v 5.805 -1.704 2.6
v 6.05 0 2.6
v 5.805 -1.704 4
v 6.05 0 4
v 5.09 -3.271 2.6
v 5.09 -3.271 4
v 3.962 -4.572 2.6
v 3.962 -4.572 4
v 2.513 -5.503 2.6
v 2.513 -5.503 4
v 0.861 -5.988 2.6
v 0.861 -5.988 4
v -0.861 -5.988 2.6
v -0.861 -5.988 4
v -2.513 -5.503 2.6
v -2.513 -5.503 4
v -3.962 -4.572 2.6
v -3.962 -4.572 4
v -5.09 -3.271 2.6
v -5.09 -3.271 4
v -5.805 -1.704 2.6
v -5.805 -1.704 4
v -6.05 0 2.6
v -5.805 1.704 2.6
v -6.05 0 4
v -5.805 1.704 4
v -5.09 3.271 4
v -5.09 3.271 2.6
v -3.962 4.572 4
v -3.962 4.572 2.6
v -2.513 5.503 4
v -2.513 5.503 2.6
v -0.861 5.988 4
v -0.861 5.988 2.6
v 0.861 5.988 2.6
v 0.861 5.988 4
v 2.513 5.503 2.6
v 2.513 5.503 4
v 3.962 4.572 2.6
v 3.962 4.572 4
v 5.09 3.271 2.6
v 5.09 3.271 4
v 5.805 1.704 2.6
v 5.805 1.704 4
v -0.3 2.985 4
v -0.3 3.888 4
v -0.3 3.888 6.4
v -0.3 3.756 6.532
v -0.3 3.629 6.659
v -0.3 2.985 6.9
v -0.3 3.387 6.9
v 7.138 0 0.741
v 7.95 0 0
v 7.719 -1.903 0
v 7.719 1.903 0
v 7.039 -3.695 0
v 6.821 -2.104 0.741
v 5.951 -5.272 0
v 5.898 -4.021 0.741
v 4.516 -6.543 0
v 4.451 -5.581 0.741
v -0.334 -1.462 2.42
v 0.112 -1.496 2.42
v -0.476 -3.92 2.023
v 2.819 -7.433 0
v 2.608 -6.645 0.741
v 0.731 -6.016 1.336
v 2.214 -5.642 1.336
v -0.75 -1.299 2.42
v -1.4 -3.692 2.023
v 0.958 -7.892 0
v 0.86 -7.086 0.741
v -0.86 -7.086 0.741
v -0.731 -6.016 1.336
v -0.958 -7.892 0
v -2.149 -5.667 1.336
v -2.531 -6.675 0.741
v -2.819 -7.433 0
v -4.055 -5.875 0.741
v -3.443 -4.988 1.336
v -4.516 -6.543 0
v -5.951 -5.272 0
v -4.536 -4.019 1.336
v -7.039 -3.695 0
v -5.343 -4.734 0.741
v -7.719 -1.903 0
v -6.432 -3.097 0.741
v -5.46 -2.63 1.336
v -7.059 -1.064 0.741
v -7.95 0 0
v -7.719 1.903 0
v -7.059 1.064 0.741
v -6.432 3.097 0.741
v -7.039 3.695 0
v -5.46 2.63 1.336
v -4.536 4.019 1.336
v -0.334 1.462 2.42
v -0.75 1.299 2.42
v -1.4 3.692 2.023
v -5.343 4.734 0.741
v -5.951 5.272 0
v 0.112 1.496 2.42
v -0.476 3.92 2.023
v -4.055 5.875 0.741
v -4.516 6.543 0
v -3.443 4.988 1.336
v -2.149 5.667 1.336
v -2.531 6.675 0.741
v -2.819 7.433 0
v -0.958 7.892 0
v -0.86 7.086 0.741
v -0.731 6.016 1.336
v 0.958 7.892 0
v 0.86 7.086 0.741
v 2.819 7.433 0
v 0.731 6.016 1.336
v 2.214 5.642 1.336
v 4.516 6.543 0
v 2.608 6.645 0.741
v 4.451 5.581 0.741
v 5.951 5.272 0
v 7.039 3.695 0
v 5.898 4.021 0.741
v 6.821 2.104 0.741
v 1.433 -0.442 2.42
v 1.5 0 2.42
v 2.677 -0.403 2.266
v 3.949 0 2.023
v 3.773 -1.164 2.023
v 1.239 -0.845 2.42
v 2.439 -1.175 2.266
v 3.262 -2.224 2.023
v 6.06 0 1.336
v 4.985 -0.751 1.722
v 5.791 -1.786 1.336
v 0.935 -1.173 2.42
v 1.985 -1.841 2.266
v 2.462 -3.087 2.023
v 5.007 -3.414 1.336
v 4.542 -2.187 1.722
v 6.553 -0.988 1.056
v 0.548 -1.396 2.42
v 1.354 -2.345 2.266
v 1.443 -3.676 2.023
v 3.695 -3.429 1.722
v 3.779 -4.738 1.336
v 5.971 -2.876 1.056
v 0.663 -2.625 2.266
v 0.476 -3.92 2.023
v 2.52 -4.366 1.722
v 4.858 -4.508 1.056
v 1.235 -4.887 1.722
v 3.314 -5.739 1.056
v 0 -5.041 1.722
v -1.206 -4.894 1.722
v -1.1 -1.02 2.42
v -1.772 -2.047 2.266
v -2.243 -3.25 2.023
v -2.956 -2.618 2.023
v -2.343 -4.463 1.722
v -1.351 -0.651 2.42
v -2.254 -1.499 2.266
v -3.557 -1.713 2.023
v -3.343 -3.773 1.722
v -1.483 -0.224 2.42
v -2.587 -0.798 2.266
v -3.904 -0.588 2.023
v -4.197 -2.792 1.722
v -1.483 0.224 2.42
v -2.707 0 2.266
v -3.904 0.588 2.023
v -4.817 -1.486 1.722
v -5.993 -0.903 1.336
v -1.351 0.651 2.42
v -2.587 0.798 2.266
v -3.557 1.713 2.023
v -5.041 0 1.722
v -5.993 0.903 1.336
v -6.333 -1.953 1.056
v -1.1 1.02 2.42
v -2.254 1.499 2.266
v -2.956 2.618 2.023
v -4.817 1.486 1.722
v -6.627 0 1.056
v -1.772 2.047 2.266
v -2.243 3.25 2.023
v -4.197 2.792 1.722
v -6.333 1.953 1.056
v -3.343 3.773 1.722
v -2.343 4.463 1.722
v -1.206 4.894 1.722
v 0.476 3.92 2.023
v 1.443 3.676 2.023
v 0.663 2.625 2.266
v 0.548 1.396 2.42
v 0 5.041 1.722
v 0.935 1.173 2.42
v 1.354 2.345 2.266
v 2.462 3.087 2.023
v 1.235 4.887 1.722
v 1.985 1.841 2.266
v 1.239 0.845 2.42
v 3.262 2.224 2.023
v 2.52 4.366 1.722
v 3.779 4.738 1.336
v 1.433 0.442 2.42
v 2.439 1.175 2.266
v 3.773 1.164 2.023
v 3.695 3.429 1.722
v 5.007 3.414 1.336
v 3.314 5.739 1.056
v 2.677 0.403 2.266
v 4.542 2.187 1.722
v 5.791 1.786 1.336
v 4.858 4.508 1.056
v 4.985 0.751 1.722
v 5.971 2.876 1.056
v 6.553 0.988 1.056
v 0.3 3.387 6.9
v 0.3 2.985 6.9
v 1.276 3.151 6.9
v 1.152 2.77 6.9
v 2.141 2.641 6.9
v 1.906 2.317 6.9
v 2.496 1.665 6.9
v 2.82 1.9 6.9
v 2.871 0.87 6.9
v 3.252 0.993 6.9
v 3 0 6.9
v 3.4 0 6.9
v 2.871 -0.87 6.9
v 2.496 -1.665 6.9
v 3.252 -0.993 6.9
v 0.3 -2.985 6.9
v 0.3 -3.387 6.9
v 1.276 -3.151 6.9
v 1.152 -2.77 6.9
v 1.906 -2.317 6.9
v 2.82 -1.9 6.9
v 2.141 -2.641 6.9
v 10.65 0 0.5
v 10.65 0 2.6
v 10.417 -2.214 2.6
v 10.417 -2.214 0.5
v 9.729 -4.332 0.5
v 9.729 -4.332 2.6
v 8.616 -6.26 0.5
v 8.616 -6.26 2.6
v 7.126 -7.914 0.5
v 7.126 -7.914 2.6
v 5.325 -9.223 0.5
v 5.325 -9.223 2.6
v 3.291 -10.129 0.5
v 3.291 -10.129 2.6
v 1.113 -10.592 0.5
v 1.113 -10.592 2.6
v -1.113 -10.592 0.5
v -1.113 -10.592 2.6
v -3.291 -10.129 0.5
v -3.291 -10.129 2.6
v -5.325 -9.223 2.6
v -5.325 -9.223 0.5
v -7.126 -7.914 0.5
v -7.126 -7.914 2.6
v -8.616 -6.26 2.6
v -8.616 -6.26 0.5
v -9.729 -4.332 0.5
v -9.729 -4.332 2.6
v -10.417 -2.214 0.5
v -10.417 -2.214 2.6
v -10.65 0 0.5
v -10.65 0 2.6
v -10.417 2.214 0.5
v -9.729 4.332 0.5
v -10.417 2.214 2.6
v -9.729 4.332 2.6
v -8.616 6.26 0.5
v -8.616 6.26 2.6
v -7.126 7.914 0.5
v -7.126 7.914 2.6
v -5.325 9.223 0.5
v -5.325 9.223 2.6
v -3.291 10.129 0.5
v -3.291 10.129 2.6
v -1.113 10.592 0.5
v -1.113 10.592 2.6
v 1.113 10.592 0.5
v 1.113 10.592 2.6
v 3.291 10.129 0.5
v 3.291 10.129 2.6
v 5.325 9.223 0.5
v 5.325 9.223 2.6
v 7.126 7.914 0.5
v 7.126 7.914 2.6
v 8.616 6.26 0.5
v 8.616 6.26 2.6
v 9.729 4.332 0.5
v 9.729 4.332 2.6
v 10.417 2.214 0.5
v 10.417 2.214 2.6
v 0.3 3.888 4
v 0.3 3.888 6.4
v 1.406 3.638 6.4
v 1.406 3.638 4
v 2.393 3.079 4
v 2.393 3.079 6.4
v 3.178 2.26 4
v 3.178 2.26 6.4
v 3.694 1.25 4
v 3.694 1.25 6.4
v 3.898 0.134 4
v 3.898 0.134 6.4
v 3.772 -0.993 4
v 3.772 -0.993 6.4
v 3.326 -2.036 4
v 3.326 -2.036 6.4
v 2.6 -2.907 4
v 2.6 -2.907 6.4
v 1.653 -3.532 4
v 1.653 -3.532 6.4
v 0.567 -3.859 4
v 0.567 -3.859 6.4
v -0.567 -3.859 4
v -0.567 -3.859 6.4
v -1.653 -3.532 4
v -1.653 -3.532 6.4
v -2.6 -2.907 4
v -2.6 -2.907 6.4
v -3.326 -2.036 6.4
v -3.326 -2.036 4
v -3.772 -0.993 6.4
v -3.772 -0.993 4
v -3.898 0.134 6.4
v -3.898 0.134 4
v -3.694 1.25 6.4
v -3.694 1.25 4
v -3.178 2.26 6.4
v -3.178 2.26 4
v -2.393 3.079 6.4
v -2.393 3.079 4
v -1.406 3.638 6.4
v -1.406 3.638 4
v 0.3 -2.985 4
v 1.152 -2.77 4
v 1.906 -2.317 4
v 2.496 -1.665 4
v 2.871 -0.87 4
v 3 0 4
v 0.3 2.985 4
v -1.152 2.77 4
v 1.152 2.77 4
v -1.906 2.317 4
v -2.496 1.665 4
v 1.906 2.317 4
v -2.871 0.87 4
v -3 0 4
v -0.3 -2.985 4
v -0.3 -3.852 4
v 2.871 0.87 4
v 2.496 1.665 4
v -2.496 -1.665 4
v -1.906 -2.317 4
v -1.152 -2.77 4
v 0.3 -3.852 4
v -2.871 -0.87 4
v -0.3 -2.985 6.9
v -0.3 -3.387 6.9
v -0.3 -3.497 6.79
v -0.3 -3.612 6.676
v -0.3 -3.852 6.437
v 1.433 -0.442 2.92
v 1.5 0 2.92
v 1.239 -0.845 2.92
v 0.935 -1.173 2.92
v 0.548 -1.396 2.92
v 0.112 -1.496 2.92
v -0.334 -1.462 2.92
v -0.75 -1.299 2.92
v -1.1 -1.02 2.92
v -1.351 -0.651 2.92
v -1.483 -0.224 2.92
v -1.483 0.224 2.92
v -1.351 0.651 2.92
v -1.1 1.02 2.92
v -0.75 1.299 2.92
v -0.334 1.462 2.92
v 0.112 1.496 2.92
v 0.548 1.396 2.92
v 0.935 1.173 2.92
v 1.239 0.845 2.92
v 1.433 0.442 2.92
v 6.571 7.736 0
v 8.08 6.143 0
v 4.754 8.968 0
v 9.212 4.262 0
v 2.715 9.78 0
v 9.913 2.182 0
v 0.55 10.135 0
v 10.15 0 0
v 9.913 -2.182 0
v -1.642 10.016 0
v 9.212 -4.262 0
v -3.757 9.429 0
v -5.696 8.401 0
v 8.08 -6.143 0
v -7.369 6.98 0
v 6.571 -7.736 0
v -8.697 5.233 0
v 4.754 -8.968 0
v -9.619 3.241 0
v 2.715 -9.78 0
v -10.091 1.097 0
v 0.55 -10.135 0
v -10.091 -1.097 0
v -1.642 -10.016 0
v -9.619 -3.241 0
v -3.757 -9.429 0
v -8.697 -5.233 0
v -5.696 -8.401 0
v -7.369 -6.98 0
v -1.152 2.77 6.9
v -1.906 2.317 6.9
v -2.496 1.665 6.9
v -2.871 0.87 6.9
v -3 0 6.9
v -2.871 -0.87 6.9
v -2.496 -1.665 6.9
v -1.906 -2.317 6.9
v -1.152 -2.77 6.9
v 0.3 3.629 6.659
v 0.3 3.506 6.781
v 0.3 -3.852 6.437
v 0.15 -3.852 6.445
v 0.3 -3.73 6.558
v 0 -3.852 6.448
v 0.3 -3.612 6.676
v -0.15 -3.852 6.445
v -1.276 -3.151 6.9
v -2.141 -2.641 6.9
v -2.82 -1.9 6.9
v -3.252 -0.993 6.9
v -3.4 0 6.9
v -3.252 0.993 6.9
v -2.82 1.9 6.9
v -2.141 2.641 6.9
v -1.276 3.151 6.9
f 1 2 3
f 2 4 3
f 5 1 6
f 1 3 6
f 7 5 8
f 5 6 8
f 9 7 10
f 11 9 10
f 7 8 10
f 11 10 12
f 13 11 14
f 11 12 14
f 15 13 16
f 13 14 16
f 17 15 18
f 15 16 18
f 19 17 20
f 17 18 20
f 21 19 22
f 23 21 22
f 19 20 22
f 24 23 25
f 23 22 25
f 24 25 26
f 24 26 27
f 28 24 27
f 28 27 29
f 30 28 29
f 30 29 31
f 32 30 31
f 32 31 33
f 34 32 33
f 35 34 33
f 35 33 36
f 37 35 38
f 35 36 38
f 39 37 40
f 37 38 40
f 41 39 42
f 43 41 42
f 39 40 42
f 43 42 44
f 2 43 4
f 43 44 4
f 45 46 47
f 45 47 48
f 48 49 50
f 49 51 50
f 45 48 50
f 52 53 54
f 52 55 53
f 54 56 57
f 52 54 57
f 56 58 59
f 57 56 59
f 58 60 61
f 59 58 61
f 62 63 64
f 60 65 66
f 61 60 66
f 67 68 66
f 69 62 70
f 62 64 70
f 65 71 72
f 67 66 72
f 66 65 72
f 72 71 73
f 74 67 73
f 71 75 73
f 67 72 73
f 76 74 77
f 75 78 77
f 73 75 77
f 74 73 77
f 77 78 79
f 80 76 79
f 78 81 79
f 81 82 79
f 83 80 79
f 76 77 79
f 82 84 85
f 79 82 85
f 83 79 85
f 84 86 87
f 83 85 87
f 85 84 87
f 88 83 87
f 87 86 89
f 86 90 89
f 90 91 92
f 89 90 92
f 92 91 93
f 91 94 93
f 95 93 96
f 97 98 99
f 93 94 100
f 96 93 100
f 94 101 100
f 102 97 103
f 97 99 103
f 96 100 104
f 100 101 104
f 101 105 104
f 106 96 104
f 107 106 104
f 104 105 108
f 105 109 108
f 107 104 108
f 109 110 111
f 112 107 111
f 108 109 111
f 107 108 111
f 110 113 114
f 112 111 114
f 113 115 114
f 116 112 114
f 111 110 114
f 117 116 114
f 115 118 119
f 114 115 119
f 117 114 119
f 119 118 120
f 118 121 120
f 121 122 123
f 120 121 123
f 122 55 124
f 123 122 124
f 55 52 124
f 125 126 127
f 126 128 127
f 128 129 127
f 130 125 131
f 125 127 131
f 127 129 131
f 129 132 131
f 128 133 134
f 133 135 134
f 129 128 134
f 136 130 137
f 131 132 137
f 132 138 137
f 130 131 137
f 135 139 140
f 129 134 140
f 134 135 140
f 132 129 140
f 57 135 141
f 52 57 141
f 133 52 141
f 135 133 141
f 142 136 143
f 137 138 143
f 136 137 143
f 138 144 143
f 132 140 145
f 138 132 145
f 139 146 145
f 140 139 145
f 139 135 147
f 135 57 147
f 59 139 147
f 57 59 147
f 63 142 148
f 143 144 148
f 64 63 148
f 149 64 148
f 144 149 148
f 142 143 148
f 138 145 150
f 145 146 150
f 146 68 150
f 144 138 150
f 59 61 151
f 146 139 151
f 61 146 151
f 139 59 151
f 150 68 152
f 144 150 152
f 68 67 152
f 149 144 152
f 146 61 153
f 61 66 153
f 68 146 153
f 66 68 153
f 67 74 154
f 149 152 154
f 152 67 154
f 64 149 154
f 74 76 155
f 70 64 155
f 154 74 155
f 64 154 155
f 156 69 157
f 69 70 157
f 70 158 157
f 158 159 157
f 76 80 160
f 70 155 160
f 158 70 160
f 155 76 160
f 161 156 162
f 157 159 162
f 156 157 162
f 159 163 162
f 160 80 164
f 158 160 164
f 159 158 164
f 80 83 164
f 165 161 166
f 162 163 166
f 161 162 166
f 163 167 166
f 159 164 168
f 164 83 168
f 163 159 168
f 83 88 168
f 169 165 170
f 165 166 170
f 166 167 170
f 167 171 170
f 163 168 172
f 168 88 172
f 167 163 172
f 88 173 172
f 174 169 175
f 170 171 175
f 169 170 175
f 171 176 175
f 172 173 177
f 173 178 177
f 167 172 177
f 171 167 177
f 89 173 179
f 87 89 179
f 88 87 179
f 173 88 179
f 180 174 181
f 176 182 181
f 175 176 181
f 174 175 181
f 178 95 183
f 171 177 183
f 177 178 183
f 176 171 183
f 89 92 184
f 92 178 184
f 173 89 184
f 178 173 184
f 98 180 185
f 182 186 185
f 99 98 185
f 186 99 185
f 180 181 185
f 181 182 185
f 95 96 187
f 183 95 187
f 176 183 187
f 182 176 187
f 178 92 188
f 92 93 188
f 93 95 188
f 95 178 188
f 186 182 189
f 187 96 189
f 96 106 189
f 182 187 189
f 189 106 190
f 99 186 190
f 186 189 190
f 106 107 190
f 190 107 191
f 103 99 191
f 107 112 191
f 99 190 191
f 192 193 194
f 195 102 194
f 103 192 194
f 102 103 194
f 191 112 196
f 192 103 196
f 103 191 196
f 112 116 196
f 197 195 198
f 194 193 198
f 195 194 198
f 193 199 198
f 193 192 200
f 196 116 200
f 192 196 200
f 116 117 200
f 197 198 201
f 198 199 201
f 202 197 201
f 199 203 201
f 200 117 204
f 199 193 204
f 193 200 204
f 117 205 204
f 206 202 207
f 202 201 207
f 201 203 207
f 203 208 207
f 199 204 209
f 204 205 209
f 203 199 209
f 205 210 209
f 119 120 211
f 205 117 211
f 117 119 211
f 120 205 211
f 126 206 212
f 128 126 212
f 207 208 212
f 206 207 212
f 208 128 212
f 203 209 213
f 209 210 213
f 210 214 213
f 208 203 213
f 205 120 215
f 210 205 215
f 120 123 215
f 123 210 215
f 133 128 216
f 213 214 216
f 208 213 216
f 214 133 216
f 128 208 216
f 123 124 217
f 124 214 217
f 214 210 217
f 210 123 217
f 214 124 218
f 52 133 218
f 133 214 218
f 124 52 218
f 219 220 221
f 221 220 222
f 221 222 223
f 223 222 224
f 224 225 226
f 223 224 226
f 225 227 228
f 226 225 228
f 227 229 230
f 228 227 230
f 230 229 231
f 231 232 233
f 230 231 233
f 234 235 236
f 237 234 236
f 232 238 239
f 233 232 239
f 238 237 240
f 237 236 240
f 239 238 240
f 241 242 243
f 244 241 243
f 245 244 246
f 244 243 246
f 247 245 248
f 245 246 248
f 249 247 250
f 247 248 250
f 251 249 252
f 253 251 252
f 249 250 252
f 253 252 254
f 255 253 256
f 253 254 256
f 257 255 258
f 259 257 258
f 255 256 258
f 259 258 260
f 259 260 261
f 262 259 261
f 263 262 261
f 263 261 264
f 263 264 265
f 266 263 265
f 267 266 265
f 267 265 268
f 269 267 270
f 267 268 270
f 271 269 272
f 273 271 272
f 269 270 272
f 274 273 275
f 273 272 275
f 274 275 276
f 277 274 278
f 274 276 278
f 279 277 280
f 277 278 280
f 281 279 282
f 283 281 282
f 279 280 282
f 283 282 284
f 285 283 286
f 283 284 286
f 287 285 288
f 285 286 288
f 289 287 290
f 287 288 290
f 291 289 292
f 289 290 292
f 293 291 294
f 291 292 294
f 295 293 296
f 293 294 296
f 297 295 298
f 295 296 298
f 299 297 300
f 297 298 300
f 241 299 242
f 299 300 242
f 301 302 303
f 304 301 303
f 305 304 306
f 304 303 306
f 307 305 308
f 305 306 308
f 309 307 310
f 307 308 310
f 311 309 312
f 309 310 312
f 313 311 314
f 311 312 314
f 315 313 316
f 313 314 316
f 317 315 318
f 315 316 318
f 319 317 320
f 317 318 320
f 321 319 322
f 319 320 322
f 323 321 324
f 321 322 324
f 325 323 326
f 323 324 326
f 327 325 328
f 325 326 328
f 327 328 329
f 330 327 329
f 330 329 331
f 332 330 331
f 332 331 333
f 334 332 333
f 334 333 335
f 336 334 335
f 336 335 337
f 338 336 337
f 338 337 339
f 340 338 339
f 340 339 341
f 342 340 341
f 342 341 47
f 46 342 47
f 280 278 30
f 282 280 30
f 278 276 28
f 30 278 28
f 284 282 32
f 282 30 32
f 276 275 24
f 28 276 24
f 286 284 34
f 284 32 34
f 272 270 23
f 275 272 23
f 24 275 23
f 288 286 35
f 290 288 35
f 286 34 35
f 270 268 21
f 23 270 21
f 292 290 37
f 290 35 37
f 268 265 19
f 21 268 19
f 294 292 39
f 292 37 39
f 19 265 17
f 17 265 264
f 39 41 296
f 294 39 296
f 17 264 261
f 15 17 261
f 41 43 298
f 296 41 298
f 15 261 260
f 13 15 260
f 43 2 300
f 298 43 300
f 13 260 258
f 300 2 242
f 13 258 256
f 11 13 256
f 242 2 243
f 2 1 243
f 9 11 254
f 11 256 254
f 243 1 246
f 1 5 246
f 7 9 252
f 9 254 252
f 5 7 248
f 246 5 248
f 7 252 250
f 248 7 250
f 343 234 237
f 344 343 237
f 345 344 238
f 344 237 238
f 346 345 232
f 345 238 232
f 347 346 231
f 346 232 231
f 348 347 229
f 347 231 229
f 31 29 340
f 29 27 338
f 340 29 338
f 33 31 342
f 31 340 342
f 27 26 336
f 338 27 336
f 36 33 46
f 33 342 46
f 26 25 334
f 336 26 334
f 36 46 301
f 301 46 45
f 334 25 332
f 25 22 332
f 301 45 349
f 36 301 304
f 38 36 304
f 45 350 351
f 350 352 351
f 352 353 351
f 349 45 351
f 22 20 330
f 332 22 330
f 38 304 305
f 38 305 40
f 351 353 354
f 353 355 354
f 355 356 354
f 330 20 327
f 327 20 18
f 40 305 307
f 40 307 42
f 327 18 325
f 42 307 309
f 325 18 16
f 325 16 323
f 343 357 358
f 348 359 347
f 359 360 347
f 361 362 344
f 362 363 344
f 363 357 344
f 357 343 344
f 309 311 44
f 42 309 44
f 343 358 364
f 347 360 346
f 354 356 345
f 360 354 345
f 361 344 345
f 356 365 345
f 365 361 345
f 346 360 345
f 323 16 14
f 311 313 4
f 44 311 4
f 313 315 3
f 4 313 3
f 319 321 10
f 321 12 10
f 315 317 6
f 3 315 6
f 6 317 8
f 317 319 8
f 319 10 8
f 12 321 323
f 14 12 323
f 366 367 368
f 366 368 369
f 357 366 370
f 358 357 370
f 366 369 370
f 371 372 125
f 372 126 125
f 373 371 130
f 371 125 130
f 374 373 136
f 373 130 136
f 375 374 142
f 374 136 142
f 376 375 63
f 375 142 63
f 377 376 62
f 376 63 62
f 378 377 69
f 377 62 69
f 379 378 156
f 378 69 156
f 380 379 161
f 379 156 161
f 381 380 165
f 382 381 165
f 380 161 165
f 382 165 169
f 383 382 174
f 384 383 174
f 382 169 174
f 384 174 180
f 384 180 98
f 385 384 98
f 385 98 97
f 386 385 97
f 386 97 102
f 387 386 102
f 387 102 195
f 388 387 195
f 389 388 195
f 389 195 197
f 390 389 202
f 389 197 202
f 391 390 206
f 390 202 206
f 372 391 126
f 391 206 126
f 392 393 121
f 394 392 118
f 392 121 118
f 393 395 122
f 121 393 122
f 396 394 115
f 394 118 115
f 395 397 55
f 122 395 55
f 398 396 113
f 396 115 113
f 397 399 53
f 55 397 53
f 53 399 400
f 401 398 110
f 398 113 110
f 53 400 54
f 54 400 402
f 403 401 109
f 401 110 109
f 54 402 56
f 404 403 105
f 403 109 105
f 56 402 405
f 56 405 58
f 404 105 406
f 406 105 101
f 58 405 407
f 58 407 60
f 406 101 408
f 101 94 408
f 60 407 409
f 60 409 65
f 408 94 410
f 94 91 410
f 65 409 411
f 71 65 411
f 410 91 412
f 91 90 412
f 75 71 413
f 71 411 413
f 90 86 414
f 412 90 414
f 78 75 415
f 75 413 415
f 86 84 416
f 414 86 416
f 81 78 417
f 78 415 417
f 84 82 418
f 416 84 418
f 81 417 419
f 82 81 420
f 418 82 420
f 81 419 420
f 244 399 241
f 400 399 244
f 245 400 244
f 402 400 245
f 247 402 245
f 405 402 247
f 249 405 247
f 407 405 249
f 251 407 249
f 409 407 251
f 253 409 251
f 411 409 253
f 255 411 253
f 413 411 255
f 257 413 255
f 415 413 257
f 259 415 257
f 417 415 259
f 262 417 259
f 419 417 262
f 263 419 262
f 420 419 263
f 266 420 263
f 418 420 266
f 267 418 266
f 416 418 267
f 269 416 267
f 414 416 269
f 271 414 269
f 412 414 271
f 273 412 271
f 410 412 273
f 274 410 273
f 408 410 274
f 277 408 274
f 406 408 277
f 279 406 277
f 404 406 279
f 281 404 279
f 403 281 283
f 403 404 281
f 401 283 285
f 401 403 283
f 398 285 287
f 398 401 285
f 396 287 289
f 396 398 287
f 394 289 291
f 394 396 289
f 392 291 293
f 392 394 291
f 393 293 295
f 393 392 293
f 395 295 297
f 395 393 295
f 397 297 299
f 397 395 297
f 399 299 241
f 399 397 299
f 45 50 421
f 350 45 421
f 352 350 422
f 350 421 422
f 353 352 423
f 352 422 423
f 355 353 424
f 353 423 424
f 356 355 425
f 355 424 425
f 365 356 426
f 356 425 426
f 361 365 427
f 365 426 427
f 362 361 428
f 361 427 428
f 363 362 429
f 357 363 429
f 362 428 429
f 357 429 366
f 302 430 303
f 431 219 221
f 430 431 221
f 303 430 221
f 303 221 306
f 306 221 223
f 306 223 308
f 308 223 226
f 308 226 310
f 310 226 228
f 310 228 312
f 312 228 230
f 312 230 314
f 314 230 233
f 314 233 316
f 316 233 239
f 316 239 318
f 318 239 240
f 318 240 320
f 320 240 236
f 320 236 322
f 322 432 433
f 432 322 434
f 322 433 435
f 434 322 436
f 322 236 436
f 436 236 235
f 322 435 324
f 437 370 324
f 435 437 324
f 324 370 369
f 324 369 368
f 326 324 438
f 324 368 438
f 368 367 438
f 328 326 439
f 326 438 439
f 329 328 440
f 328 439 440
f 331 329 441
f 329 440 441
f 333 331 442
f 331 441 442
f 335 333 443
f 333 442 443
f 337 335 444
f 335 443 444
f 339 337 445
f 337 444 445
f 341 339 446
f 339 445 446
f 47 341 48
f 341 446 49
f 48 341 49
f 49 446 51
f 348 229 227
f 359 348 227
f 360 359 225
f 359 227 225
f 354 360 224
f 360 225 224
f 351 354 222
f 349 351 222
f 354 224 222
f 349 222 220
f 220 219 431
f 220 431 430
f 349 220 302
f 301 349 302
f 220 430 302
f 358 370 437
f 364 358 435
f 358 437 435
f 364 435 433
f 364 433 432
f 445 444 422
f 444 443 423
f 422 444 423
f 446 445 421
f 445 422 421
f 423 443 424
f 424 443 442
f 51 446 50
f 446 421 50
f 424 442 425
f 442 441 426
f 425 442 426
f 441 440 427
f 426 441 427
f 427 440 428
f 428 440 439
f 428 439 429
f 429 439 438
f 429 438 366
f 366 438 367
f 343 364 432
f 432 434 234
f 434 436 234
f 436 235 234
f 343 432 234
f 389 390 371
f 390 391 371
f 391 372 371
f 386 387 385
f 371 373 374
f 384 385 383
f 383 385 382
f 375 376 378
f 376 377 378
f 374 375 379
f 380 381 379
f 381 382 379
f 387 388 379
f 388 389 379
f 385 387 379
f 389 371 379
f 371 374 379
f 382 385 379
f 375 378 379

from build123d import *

# Parameters (mm, degrees)
F2_SIZE  = 0.5
F3_SIZE  = 0.5
F6_DEPTH = 2.9


with BuildPart() as f1:
    # F0 (on Front) → F1 (revolve)
    with BuildSketch(Plane.XZ):
        with BuildLine():
            add(Edge.make_bspline(
                [(1.5, 2.4199453937), (3.8369755758, 2.1967958582), (6.7693715651, 1.4854960684), (7.95, 0)],
                knots=[1.568331731, 1.568331731, 1.568331731, 1.568331731, 8.3338166527, 8.3338166527, 8.3338166527, 8.3338166527], degree=3))
            Line((7.95, 0), (10.65, 0))
            Line((10.65, 0), (10.65, 2.6))
            Line((10.65, 2.6), (6.05, 2.6))
            Line((6.05, 2.6), (6.05, 4))
            Line((6.05, 4), (3.9, 4))
            Line((3.9, 4), (3.9, 6.9))
            Line((3.9, 6.9), (0, 6.9))
            Line((0, 6.9), (0, 2.9199453937))
            Line((0, 2.9199453937), (1.5, 2.9199453937))
            Line((1.5, 2.9199453937), (1.5, 2.4199453937))
        make_face()
    revolve(axis=Axis((0, 0, 3.45), (0, 0, -1)))

    # F2
    f2_edges = [f1.edges().sort_by_distance(p)[0] for p in [
        (-3.9, 0, 6.9),
    ]]
    chamfer(f2_edges, length=F2_SIZE)

    # F3
    f3_edges = [f1.edges().sort_by_distance(p)[0] for p in [
        (-10.65, 0, 0),
    ]]
    chamfer(f3_edges, length=F3_SIZE)

    # F5 (on offset) → F6 (cut)
    with BuildSketch(Plane.XY.offset(6.9)):
        with BuildLine():
            ThreePointArc((0.3, -2.9849623113), (2.2248595461, -2.0124611797), (3, 0))
            ThreePointArc((3, 0), (2.2248595461, 2.0124611797), (0.3, 2.9849623113))
            Line((0.3, 2.9849623113), (0.3, 0))
            Line((0.3, 0), (0.3, -2.9849623113))
        make_face()
        with BuildLine():
            Line((0.3, 0), (0.3, 2.9849623113))
            ThreePointArc((0.3, 2.9849623113), (0, 3), (-0.3, 2.9849623113))
            Line((-0.3, 2.9849623113), (-0.3, 0))
            Line((-0.3, 0), (0, 0))
            Line((0, 0), (0.3, 0))
        make_face()
        with BuildLine():
            ThreePointArc((-0.3, 2.9849623113), (0, 3), (0.3, 2.9849623113))
            Line((0.3, 2.9849623113), (0.3, 4.0277631488))
            Line((0.3, 4.0277631488), (-0.3, 4.0277631488))
            Line((-0.3, 4.0277631488), (-0.3, 2.9849623113))
        make_face()
        with BuildLine():
            Line((0.3, -3.8517790381), (0.3, -2.9849623113))
            ThreePointArc((0.3, -2.9849623113), (0, -3), (-0.3, -2.9849623113))
            Line((-0.3, -2.9849623113), (-0.3, -3.8517790381))
            Line((-0.3, -3.8517790381), (0.3, -3.8517790381))
        make_face()
        with BuildLine():
            ThreePointArc((-0.3, -2.9849623113), (0, -3), (0.3, -2.9849623113))
            Line((0.3, -2.9849623113), (0.3, 0))
            Line((0.3, 0), (0, 0))
            Line((0, 0), (-0.3, 0))
            Line((-0.3, 0), (-0.3, -2.9849623113))
        make_face()
        with BuildLine():
            Line((-0.3, 0), (-0.3, 2.9849623113))
            ThreePointArc((-0.3, 2.9849623113), (-3, 0), (-0.3, -2.9849623113))
            Line((-0.3, -2.9849623113), (-0.3, 0))
        make_face()
    extrude(amount=-F6_DEPTH, mode=Mode.SUBTRACT)


solid = f1.part
